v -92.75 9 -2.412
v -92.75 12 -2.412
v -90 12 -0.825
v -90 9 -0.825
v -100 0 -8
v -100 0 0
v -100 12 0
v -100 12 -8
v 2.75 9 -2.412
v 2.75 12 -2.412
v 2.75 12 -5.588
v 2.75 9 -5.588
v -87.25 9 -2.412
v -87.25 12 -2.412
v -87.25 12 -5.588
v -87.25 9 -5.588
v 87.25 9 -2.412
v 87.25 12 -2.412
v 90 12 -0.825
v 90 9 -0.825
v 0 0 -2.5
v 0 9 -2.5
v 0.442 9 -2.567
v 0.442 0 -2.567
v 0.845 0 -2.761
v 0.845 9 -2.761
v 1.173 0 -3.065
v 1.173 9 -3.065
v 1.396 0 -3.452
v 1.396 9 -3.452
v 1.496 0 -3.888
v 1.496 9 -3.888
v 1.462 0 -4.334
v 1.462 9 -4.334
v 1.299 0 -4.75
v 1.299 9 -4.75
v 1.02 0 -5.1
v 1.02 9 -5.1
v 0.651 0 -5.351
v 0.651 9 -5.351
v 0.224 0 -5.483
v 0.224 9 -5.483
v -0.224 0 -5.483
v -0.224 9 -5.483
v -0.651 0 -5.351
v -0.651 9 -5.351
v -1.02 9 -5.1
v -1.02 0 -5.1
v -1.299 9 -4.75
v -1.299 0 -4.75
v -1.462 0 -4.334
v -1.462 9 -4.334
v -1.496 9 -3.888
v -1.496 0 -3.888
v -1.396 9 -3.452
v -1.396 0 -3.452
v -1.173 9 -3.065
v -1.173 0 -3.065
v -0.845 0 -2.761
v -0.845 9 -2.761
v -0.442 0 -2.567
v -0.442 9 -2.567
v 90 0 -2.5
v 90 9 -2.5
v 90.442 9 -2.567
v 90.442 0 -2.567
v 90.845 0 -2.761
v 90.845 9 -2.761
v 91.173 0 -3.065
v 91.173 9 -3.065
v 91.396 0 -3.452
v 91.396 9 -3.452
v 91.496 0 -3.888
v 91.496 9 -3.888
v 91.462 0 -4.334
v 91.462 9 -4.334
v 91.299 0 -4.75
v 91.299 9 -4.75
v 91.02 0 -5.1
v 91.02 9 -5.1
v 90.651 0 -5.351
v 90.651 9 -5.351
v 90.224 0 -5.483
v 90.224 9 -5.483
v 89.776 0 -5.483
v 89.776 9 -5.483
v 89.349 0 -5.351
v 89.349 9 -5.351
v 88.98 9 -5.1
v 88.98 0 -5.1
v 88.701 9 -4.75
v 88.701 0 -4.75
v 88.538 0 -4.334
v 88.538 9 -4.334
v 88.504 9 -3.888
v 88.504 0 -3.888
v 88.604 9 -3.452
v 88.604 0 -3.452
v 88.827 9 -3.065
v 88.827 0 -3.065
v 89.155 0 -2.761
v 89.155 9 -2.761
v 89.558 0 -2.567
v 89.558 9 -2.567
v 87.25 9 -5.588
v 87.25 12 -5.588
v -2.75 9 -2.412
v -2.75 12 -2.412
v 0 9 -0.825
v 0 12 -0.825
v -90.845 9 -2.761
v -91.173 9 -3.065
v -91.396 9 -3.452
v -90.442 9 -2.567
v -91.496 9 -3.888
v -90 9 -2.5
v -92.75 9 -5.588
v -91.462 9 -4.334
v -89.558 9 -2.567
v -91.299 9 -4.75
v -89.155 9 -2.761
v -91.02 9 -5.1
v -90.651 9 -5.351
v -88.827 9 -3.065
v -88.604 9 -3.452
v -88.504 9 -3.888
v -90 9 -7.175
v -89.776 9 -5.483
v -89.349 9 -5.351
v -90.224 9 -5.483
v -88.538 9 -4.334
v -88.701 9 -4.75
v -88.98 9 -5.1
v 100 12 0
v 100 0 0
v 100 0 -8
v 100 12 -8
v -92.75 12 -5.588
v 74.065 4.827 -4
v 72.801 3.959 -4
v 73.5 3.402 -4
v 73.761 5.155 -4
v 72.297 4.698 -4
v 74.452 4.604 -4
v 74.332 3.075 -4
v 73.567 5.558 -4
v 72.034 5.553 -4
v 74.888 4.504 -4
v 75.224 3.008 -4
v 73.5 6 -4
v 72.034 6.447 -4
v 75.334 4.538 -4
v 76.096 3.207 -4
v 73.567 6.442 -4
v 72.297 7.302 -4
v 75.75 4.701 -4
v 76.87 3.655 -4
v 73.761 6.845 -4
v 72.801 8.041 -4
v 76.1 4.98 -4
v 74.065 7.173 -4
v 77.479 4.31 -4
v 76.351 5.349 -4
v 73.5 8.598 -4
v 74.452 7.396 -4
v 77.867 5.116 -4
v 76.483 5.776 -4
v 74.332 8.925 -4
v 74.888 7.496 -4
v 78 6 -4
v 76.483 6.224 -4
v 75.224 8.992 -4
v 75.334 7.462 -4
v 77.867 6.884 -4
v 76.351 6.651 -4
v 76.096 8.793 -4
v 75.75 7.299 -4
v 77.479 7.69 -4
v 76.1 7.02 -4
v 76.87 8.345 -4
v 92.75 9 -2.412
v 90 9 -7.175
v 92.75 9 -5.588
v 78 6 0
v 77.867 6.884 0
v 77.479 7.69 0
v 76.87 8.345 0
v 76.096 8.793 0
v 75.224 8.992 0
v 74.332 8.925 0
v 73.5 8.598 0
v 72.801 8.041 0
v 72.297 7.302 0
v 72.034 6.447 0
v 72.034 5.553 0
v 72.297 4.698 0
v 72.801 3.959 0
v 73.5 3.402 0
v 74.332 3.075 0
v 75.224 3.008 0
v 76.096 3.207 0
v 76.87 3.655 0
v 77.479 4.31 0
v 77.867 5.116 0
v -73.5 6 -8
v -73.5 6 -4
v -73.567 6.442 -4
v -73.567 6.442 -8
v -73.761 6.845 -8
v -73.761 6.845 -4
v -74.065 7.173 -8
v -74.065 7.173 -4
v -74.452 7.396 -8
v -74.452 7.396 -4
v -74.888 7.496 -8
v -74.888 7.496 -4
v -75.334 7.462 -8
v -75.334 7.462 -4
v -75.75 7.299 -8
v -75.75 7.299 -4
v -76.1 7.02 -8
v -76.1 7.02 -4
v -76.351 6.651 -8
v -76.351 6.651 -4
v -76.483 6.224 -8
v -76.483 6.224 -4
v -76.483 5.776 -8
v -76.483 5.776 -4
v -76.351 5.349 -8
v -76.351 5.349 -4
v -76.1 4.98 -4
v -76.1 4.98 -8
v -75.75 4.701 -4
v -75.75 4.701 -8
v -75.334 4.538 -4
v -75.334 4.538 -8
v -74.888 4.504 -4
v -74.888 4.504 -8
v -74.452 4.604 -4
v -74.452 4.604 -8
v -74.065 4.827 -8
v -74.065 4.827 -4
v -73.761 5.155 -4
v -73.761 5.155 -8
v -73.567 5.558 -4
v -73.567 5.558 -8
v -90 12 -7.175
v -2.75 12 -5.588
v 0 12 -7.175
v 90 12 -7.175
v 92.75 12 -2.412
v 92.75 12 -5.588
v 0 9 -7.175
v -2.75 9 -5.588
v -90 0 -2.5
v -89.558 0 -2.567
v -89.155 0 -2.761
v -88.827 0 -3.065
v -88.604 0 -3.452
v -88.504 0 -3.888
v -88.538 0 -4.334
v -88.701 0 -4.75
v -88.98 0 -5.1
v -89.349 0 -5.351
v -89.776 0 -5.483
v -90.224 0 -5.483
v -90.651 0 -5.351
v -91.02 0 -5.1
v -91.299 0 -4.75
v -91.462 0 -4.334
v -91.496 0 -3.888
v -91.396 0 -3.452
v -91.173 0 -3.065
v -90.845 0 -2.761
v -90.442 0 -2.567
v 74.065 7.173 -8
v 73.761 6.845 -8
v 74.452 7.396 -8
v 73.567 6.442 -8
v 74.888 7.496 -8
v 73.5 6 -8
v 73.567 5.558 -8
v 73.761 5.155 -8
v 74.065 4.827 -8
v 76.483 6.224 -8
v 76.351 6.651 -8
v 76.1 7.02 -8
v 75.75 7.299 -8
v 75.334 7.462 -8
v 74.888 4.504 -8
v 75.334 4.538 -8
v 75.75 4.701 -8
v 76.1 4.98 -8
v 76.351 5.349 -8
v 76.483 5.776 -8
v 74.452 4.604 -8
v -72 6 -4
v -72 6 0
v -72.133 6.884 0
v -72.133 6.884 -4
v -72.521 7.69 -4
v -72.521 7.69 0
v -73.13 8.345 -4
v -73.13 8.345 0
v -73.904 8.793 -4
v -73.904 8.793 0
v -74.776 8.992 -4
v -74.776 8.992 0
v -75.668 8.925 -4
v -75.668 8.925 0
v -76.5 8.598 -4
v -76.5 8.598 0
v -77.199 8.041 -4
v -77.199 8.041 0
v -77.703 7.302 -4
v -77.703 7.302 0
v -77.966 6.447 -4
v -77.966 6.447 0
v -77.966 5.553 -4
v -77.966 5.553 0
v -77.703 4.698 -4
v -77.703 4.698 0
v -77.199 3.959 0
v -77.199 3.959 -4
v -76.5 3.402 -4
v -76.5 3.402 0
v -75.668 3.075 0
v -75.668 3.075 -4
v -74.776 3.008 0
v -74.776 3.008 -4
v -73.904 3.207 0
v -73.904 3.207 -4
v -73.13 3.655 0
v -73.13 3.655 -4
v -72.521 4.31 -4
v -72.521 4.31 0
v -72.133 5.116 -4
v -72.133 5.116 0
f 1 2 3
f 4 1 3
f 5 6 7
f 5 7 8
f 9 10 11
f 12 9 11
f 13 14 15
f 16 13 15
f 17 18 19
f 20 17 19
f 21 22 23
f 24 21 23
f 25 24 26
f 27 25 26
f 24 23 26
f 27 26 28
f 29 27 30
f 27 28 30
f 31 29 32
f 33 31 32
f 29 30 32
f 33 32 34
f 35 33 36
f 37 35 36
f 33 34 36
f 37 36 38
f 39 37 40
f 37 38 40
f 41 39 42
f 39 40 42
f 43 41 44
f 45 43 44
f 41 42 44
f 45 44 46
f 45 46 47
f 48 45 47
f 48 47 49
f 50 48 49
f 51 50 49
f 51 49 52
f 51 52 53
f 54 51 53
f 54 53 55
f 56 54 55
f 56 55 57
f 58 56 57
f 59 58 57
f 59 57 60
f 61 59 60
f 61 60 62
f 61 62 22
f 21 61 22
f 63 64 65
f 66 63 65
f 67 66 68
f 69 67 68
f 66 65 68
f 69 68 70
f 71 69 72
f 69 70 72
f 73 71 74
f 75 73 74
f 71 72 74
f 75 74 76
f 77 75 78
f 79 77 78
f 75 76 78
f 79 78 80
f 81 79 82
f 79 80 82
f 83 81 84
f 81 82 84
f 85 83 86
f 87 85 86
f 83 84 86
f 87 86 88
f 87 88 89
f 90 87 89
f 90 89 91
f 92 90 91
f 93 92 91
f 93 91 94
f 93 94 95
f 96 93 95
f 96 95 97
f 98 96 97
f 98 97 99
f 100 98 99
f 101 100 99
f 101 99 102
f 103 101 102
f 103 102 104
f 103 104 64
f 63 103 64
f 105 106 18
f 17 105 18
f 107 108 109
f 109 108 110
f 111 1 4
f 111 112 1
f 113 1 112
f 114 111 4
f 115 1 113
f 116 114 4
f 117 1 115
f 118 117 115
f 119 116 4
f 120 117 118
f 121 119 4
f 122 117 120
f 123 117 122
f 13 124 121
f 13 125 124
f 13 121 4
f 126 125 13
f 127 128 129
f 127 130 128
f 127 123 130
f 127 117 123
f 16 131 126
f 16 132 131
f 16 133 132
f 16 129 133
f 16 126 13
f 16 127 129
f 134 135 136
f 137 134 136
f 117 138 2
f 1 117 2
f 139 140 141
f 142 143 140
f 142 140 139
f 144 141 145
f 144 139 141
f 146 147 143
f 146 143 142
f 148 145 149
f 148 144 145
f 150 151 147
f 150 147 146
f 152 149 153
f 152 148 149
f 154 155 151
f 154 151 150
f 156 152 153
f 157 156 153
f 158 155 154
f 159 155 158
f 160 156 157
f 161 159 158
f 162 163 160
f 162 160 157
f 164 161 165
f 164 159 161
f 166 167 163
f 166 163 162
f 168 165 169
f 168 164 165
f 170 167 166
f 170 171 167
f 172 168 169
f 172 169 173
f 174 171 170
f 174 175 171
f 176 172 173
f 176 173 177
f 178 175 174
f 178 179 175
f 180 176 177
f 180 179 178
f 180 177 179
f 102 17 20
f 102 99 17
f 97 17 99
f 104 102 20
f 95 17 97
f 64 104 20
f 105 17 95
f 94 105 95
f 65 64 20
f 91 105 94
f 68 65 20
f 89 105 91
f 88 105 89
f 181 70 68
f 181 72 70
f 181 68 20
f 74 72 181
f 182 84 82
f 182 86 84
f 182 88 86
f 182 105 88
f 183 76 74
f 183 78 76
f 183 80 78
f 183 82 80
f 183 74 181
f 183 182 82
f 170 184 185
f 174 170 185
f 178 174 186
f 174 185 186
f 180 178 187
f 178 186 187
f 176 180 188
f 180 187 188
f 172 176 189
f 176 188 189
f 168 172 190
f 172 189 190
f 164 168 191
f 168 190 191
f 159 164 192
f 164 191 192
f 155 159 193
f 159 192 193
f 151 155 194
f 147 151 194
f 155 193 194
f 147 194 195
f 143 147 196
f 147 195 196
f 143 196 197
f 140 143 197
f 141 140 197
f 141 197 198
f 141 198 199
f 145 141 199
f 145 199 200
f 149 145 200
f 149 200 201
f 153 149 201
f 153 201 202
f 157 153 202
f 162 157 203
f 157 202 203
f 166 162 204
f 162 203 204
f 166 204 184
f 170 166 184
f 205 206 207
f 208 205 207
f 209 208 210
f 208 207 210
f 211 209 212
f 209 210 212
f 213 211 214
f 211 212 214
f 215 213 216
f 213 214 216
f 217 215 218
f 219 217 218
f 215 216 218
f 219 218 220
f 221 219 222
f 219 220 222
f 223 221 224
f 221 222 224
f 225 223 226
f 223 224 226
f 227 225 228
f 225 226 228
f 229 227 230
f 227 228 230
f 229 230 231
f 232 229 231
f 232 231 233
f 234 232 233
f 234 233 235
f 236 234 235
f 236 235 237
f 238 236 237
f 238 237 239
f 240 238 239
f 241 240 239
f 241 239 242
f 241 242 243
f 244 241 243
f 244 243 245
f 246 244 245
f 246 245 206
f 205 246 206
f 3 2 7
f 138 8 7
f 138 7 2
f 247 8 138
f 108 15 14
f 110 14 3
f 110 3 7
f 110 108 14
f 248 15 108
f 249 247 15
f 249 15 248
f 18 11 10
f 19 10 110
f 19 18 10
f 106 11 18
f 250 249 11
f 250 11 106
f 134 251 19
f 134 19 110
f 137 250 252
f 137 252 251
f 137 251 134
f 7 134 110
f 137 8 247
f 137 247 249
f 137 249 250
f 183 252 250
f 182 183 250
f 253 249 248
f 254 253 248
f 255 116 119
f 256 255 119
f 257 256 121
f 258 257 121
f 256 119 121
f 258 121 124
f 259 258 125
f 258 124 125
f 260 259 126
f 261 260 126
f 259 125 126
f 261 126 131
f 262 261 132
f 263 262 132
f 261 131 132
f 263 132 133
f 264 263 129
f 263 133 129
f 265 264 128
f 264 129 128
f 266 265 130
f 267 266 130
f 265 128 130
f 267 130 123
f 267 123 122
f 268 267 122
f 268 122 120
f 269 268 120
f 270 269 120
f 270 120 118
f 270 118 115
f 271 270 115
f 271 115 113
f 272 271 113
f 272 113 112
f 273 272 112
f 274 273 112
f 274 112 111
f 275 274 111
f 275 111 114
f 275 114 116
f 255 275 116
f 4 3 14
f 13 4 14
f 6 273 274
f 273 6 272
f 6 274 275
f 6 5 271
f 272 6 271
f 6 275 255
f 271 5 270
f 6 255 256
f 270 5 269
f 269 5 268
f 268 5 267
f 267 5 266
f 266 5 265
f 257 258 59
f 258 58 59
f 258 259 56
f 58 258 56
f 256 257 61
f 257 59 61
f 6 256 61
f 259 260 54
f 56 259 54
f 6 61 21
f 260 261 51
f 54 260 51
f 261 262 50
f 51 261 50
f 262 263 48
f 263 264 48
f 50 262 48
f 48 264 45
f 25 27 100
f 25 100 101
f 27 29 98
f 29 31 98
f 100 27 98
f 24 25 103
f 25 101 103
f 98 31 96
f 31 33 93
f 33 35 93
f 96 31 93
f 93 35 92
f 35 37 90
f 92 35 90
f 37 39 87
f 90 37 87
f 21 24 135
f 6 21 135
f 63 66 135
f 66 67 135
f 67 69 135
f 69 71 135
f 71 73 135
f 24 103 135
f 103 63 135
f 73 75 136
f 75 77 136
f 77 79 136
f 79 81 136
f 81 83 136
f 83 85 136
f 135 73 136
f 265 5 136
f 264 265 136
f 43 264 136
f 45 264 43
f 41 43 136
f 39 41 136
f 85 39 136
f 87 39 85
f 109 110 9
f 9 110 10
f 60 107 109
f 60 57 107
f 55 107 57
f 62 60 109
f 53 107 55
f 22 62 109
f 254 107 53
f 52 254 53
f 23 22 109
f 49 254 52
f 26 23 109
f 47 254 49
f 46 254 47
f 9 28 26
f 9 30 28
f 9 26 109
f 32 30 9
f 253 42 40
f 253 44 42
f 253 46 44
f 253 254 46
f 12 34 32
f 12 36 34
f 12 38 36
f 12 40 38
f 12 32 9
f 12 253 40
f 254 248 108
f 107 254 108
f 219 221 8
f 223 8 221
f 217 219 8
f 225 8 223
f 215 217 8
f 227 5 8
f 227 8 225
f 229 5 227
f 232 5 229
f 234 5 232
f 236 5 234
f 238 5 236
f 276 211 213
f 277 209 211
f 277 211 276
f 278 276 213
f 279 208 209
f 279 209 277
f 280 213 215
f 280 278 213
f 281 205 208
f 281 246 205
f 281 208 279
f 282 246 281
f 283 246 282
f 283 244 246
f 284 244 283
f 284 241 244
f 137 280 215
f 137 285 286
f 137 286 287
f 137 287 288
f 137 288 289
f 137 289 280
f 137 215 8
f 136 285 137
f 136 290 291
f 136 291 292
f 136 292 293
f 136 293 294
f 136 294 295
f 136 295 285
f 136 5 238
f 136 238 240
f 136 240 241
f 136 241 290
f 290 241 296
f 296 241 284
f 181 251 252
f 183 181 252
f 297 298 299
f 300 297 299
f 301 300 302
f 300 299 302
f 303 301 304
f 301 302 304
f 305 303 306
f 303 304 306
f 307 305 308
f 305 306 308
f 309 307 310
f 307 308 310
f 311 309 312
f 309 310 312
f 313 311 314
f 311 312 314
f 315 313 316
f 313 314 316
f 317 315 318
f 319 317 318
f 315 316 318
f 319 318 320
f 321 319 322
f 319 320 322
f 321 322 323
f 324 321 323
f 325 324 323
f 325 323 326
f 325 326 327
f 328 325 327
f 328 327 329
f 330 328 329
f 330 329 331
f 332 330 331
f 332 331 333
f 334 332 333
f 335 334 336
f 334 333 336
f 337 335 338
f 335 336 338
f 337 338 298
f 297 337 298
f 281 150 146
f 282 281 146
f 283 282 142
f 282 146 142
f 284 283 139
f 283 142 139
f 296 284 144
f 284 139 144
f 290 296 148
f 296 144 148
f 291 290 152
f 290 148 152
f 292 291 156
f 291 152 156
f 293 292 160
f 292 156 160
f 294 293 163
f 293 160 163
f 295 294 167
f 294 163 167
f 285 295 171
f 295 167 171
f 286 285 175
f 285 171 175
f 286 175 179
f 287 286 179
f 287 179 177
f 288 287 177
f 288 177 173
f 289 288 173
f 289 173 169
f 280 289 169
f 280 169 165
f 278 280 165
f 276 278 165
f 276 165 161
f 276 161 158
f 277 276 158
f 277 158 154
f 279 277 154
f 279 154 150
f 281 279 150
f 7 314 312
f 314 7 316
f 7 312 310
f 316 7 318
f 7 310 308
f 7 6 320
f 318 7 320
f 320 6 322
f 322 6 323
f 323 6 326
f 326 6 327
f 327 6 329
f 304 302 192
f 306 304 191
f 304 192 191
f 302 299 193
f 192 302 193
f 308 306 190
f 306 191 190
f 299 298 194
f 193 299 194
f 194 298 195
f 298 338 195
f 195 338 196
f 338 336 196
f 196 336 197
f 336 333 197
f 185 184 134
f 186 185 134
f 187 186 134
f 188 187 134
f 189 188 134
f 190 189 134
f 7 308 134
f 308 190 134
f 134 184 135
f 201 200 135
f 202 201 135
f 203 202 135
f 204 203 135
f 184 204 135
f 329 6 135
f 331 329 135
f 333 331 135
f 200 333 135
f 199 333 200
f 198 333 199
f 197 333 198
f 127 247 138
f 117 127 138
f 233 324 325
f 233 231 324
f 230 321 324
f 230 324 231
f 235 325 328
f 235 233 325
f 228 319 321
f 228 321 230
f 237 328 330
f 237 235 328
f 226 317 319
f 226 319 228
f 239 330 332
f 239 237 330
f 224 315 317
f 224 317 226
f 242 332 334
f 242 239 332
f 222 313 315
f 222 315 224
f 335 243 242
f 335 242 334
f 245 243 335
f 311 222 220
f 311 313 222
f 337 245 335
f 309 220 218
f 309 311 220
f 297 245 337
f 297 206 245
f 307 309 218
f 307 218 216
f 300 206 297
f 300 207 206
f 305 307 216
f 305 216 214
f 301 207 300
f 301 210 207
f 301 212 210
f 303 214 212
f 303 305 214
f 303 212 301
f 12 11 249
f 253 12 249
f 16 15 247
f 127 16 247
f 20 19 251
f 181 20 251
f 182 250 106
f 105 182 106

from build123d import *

# Parameters (mm, degrees)
ESQUISSE1_W             = 200
ESQUISSE1_H             = 8
BOSS_EXTRU_1_DEPTH      = 12
ESQUISSE2_R             = 1.5
ENL_V_MAT_EXTRU_1_DEPTH = 102.034647523
ESQUISSE3_R             = 1.5
ENL_V_MAT_EXTRU_2_DEPTH = 102.034647523
ESQUISSE4_R             = 3
ENL_V_MAT_EXTRU_3_DEPTH = 4
ENL_V_MAT_EXTRU_4_DEPTH = 3


with BuildPart() as part:
    # Esquisse1 → Boss.-Extru.1 (new body)
    with BuildSketch(Plane(origin=(0, 0, 0), x_dir=(1, 0, 0), z_dir=(0, 1, 0))):
        with Locations((0, 4)):
            Rectangle(ESQUISSE1_W, ESQUISSE1_H)
    extrude(amount=BOSS_EXTRU_1_DEPTH)

    # Esquisse2 → Enlèv. mat.-Extru.1 (cut, through all)
    with BuildSketch(Plane(origin=(0, 12, 0), x_dir=(1, 0, 0), z_dir=(0, 1, 0))):
        with Locations(Location((-90, 4, 0), (0, 0, 270))):
            Circle(ESQUISSE2_R)
        with Locations(Location((0, 4, 0), (0, 0, 270))):
            Circle(ESQUISSE2_R)
        with Locations(Location((90, 4, 0), (0, 0, 270))):
            Circle(ESQUISSE2_R)
    extrude(amount=-ENL_V_MAT_EXTRU_1_DEPTH, mode=Mode.SUBTRACT)

    # Esquisse3 → Enlèv. mat.-Extru.2 (cut, through all)
    with BuildSketch(Plane.XY):
        with Locations((-75, 6)):
            Circle(ESQUISSE3_R)
        with Locations(Location((75, 6, 0), (0, 0, 180))):
            Circle(ESQUISSE3_R)
    extrude(amount=-ENL_V_MAT_EXTRU_2_DEPTH, mode=Mode.SUBTRACT)

    # Esquisse4 → Enlèv. mat.-Extru.3 (cut)
    with BuildSketch(Plane.XY):
        with Locations((-75, 6)):
            Circle(ESQUISSE4_R)
        with Locations((75, 6)):
            Circle(ESQUISSE4_R)
    extrude(amount=-ENL_V_MAT_EXTRU_3_DEPTH, mode=Mode.SUBTRACT)

    # Esquisse5 → Enlèv. mat.-Extru.4 (cut)
    with BuildSketch(Plane(origin=(0, 12, 0), x_dir=(1, 0, 0), z_dir=(0, 1, 0))):
        Polygon((-87.25, 5.58771324), (-90, 7.175426481), (-92.75, 5.58771324), (-92.75, 2.41228676), (-90, 0.824573519), (-87.25, 2.41228676), align=None)
        Polygon((2.75, 5.58771324), (0, 7.175426481), (-2.75, 5.58771324), (-2.75, 2.41228676), (0, 0.824573519), (2.75, 2.41228676), align=None)
        Polygon((92.75, 5.58771324), (90, 7.175426481), (87.25, 5.58771324), (87.25, 2.41228676), (90, 0.824573519), (92.75, 2.41228676), align=None)
    extrude(amount=-ENL_V_MAT_EXTRU_4_DEPTH, mode=Mode.SUBTRACT)


solid = part.part
